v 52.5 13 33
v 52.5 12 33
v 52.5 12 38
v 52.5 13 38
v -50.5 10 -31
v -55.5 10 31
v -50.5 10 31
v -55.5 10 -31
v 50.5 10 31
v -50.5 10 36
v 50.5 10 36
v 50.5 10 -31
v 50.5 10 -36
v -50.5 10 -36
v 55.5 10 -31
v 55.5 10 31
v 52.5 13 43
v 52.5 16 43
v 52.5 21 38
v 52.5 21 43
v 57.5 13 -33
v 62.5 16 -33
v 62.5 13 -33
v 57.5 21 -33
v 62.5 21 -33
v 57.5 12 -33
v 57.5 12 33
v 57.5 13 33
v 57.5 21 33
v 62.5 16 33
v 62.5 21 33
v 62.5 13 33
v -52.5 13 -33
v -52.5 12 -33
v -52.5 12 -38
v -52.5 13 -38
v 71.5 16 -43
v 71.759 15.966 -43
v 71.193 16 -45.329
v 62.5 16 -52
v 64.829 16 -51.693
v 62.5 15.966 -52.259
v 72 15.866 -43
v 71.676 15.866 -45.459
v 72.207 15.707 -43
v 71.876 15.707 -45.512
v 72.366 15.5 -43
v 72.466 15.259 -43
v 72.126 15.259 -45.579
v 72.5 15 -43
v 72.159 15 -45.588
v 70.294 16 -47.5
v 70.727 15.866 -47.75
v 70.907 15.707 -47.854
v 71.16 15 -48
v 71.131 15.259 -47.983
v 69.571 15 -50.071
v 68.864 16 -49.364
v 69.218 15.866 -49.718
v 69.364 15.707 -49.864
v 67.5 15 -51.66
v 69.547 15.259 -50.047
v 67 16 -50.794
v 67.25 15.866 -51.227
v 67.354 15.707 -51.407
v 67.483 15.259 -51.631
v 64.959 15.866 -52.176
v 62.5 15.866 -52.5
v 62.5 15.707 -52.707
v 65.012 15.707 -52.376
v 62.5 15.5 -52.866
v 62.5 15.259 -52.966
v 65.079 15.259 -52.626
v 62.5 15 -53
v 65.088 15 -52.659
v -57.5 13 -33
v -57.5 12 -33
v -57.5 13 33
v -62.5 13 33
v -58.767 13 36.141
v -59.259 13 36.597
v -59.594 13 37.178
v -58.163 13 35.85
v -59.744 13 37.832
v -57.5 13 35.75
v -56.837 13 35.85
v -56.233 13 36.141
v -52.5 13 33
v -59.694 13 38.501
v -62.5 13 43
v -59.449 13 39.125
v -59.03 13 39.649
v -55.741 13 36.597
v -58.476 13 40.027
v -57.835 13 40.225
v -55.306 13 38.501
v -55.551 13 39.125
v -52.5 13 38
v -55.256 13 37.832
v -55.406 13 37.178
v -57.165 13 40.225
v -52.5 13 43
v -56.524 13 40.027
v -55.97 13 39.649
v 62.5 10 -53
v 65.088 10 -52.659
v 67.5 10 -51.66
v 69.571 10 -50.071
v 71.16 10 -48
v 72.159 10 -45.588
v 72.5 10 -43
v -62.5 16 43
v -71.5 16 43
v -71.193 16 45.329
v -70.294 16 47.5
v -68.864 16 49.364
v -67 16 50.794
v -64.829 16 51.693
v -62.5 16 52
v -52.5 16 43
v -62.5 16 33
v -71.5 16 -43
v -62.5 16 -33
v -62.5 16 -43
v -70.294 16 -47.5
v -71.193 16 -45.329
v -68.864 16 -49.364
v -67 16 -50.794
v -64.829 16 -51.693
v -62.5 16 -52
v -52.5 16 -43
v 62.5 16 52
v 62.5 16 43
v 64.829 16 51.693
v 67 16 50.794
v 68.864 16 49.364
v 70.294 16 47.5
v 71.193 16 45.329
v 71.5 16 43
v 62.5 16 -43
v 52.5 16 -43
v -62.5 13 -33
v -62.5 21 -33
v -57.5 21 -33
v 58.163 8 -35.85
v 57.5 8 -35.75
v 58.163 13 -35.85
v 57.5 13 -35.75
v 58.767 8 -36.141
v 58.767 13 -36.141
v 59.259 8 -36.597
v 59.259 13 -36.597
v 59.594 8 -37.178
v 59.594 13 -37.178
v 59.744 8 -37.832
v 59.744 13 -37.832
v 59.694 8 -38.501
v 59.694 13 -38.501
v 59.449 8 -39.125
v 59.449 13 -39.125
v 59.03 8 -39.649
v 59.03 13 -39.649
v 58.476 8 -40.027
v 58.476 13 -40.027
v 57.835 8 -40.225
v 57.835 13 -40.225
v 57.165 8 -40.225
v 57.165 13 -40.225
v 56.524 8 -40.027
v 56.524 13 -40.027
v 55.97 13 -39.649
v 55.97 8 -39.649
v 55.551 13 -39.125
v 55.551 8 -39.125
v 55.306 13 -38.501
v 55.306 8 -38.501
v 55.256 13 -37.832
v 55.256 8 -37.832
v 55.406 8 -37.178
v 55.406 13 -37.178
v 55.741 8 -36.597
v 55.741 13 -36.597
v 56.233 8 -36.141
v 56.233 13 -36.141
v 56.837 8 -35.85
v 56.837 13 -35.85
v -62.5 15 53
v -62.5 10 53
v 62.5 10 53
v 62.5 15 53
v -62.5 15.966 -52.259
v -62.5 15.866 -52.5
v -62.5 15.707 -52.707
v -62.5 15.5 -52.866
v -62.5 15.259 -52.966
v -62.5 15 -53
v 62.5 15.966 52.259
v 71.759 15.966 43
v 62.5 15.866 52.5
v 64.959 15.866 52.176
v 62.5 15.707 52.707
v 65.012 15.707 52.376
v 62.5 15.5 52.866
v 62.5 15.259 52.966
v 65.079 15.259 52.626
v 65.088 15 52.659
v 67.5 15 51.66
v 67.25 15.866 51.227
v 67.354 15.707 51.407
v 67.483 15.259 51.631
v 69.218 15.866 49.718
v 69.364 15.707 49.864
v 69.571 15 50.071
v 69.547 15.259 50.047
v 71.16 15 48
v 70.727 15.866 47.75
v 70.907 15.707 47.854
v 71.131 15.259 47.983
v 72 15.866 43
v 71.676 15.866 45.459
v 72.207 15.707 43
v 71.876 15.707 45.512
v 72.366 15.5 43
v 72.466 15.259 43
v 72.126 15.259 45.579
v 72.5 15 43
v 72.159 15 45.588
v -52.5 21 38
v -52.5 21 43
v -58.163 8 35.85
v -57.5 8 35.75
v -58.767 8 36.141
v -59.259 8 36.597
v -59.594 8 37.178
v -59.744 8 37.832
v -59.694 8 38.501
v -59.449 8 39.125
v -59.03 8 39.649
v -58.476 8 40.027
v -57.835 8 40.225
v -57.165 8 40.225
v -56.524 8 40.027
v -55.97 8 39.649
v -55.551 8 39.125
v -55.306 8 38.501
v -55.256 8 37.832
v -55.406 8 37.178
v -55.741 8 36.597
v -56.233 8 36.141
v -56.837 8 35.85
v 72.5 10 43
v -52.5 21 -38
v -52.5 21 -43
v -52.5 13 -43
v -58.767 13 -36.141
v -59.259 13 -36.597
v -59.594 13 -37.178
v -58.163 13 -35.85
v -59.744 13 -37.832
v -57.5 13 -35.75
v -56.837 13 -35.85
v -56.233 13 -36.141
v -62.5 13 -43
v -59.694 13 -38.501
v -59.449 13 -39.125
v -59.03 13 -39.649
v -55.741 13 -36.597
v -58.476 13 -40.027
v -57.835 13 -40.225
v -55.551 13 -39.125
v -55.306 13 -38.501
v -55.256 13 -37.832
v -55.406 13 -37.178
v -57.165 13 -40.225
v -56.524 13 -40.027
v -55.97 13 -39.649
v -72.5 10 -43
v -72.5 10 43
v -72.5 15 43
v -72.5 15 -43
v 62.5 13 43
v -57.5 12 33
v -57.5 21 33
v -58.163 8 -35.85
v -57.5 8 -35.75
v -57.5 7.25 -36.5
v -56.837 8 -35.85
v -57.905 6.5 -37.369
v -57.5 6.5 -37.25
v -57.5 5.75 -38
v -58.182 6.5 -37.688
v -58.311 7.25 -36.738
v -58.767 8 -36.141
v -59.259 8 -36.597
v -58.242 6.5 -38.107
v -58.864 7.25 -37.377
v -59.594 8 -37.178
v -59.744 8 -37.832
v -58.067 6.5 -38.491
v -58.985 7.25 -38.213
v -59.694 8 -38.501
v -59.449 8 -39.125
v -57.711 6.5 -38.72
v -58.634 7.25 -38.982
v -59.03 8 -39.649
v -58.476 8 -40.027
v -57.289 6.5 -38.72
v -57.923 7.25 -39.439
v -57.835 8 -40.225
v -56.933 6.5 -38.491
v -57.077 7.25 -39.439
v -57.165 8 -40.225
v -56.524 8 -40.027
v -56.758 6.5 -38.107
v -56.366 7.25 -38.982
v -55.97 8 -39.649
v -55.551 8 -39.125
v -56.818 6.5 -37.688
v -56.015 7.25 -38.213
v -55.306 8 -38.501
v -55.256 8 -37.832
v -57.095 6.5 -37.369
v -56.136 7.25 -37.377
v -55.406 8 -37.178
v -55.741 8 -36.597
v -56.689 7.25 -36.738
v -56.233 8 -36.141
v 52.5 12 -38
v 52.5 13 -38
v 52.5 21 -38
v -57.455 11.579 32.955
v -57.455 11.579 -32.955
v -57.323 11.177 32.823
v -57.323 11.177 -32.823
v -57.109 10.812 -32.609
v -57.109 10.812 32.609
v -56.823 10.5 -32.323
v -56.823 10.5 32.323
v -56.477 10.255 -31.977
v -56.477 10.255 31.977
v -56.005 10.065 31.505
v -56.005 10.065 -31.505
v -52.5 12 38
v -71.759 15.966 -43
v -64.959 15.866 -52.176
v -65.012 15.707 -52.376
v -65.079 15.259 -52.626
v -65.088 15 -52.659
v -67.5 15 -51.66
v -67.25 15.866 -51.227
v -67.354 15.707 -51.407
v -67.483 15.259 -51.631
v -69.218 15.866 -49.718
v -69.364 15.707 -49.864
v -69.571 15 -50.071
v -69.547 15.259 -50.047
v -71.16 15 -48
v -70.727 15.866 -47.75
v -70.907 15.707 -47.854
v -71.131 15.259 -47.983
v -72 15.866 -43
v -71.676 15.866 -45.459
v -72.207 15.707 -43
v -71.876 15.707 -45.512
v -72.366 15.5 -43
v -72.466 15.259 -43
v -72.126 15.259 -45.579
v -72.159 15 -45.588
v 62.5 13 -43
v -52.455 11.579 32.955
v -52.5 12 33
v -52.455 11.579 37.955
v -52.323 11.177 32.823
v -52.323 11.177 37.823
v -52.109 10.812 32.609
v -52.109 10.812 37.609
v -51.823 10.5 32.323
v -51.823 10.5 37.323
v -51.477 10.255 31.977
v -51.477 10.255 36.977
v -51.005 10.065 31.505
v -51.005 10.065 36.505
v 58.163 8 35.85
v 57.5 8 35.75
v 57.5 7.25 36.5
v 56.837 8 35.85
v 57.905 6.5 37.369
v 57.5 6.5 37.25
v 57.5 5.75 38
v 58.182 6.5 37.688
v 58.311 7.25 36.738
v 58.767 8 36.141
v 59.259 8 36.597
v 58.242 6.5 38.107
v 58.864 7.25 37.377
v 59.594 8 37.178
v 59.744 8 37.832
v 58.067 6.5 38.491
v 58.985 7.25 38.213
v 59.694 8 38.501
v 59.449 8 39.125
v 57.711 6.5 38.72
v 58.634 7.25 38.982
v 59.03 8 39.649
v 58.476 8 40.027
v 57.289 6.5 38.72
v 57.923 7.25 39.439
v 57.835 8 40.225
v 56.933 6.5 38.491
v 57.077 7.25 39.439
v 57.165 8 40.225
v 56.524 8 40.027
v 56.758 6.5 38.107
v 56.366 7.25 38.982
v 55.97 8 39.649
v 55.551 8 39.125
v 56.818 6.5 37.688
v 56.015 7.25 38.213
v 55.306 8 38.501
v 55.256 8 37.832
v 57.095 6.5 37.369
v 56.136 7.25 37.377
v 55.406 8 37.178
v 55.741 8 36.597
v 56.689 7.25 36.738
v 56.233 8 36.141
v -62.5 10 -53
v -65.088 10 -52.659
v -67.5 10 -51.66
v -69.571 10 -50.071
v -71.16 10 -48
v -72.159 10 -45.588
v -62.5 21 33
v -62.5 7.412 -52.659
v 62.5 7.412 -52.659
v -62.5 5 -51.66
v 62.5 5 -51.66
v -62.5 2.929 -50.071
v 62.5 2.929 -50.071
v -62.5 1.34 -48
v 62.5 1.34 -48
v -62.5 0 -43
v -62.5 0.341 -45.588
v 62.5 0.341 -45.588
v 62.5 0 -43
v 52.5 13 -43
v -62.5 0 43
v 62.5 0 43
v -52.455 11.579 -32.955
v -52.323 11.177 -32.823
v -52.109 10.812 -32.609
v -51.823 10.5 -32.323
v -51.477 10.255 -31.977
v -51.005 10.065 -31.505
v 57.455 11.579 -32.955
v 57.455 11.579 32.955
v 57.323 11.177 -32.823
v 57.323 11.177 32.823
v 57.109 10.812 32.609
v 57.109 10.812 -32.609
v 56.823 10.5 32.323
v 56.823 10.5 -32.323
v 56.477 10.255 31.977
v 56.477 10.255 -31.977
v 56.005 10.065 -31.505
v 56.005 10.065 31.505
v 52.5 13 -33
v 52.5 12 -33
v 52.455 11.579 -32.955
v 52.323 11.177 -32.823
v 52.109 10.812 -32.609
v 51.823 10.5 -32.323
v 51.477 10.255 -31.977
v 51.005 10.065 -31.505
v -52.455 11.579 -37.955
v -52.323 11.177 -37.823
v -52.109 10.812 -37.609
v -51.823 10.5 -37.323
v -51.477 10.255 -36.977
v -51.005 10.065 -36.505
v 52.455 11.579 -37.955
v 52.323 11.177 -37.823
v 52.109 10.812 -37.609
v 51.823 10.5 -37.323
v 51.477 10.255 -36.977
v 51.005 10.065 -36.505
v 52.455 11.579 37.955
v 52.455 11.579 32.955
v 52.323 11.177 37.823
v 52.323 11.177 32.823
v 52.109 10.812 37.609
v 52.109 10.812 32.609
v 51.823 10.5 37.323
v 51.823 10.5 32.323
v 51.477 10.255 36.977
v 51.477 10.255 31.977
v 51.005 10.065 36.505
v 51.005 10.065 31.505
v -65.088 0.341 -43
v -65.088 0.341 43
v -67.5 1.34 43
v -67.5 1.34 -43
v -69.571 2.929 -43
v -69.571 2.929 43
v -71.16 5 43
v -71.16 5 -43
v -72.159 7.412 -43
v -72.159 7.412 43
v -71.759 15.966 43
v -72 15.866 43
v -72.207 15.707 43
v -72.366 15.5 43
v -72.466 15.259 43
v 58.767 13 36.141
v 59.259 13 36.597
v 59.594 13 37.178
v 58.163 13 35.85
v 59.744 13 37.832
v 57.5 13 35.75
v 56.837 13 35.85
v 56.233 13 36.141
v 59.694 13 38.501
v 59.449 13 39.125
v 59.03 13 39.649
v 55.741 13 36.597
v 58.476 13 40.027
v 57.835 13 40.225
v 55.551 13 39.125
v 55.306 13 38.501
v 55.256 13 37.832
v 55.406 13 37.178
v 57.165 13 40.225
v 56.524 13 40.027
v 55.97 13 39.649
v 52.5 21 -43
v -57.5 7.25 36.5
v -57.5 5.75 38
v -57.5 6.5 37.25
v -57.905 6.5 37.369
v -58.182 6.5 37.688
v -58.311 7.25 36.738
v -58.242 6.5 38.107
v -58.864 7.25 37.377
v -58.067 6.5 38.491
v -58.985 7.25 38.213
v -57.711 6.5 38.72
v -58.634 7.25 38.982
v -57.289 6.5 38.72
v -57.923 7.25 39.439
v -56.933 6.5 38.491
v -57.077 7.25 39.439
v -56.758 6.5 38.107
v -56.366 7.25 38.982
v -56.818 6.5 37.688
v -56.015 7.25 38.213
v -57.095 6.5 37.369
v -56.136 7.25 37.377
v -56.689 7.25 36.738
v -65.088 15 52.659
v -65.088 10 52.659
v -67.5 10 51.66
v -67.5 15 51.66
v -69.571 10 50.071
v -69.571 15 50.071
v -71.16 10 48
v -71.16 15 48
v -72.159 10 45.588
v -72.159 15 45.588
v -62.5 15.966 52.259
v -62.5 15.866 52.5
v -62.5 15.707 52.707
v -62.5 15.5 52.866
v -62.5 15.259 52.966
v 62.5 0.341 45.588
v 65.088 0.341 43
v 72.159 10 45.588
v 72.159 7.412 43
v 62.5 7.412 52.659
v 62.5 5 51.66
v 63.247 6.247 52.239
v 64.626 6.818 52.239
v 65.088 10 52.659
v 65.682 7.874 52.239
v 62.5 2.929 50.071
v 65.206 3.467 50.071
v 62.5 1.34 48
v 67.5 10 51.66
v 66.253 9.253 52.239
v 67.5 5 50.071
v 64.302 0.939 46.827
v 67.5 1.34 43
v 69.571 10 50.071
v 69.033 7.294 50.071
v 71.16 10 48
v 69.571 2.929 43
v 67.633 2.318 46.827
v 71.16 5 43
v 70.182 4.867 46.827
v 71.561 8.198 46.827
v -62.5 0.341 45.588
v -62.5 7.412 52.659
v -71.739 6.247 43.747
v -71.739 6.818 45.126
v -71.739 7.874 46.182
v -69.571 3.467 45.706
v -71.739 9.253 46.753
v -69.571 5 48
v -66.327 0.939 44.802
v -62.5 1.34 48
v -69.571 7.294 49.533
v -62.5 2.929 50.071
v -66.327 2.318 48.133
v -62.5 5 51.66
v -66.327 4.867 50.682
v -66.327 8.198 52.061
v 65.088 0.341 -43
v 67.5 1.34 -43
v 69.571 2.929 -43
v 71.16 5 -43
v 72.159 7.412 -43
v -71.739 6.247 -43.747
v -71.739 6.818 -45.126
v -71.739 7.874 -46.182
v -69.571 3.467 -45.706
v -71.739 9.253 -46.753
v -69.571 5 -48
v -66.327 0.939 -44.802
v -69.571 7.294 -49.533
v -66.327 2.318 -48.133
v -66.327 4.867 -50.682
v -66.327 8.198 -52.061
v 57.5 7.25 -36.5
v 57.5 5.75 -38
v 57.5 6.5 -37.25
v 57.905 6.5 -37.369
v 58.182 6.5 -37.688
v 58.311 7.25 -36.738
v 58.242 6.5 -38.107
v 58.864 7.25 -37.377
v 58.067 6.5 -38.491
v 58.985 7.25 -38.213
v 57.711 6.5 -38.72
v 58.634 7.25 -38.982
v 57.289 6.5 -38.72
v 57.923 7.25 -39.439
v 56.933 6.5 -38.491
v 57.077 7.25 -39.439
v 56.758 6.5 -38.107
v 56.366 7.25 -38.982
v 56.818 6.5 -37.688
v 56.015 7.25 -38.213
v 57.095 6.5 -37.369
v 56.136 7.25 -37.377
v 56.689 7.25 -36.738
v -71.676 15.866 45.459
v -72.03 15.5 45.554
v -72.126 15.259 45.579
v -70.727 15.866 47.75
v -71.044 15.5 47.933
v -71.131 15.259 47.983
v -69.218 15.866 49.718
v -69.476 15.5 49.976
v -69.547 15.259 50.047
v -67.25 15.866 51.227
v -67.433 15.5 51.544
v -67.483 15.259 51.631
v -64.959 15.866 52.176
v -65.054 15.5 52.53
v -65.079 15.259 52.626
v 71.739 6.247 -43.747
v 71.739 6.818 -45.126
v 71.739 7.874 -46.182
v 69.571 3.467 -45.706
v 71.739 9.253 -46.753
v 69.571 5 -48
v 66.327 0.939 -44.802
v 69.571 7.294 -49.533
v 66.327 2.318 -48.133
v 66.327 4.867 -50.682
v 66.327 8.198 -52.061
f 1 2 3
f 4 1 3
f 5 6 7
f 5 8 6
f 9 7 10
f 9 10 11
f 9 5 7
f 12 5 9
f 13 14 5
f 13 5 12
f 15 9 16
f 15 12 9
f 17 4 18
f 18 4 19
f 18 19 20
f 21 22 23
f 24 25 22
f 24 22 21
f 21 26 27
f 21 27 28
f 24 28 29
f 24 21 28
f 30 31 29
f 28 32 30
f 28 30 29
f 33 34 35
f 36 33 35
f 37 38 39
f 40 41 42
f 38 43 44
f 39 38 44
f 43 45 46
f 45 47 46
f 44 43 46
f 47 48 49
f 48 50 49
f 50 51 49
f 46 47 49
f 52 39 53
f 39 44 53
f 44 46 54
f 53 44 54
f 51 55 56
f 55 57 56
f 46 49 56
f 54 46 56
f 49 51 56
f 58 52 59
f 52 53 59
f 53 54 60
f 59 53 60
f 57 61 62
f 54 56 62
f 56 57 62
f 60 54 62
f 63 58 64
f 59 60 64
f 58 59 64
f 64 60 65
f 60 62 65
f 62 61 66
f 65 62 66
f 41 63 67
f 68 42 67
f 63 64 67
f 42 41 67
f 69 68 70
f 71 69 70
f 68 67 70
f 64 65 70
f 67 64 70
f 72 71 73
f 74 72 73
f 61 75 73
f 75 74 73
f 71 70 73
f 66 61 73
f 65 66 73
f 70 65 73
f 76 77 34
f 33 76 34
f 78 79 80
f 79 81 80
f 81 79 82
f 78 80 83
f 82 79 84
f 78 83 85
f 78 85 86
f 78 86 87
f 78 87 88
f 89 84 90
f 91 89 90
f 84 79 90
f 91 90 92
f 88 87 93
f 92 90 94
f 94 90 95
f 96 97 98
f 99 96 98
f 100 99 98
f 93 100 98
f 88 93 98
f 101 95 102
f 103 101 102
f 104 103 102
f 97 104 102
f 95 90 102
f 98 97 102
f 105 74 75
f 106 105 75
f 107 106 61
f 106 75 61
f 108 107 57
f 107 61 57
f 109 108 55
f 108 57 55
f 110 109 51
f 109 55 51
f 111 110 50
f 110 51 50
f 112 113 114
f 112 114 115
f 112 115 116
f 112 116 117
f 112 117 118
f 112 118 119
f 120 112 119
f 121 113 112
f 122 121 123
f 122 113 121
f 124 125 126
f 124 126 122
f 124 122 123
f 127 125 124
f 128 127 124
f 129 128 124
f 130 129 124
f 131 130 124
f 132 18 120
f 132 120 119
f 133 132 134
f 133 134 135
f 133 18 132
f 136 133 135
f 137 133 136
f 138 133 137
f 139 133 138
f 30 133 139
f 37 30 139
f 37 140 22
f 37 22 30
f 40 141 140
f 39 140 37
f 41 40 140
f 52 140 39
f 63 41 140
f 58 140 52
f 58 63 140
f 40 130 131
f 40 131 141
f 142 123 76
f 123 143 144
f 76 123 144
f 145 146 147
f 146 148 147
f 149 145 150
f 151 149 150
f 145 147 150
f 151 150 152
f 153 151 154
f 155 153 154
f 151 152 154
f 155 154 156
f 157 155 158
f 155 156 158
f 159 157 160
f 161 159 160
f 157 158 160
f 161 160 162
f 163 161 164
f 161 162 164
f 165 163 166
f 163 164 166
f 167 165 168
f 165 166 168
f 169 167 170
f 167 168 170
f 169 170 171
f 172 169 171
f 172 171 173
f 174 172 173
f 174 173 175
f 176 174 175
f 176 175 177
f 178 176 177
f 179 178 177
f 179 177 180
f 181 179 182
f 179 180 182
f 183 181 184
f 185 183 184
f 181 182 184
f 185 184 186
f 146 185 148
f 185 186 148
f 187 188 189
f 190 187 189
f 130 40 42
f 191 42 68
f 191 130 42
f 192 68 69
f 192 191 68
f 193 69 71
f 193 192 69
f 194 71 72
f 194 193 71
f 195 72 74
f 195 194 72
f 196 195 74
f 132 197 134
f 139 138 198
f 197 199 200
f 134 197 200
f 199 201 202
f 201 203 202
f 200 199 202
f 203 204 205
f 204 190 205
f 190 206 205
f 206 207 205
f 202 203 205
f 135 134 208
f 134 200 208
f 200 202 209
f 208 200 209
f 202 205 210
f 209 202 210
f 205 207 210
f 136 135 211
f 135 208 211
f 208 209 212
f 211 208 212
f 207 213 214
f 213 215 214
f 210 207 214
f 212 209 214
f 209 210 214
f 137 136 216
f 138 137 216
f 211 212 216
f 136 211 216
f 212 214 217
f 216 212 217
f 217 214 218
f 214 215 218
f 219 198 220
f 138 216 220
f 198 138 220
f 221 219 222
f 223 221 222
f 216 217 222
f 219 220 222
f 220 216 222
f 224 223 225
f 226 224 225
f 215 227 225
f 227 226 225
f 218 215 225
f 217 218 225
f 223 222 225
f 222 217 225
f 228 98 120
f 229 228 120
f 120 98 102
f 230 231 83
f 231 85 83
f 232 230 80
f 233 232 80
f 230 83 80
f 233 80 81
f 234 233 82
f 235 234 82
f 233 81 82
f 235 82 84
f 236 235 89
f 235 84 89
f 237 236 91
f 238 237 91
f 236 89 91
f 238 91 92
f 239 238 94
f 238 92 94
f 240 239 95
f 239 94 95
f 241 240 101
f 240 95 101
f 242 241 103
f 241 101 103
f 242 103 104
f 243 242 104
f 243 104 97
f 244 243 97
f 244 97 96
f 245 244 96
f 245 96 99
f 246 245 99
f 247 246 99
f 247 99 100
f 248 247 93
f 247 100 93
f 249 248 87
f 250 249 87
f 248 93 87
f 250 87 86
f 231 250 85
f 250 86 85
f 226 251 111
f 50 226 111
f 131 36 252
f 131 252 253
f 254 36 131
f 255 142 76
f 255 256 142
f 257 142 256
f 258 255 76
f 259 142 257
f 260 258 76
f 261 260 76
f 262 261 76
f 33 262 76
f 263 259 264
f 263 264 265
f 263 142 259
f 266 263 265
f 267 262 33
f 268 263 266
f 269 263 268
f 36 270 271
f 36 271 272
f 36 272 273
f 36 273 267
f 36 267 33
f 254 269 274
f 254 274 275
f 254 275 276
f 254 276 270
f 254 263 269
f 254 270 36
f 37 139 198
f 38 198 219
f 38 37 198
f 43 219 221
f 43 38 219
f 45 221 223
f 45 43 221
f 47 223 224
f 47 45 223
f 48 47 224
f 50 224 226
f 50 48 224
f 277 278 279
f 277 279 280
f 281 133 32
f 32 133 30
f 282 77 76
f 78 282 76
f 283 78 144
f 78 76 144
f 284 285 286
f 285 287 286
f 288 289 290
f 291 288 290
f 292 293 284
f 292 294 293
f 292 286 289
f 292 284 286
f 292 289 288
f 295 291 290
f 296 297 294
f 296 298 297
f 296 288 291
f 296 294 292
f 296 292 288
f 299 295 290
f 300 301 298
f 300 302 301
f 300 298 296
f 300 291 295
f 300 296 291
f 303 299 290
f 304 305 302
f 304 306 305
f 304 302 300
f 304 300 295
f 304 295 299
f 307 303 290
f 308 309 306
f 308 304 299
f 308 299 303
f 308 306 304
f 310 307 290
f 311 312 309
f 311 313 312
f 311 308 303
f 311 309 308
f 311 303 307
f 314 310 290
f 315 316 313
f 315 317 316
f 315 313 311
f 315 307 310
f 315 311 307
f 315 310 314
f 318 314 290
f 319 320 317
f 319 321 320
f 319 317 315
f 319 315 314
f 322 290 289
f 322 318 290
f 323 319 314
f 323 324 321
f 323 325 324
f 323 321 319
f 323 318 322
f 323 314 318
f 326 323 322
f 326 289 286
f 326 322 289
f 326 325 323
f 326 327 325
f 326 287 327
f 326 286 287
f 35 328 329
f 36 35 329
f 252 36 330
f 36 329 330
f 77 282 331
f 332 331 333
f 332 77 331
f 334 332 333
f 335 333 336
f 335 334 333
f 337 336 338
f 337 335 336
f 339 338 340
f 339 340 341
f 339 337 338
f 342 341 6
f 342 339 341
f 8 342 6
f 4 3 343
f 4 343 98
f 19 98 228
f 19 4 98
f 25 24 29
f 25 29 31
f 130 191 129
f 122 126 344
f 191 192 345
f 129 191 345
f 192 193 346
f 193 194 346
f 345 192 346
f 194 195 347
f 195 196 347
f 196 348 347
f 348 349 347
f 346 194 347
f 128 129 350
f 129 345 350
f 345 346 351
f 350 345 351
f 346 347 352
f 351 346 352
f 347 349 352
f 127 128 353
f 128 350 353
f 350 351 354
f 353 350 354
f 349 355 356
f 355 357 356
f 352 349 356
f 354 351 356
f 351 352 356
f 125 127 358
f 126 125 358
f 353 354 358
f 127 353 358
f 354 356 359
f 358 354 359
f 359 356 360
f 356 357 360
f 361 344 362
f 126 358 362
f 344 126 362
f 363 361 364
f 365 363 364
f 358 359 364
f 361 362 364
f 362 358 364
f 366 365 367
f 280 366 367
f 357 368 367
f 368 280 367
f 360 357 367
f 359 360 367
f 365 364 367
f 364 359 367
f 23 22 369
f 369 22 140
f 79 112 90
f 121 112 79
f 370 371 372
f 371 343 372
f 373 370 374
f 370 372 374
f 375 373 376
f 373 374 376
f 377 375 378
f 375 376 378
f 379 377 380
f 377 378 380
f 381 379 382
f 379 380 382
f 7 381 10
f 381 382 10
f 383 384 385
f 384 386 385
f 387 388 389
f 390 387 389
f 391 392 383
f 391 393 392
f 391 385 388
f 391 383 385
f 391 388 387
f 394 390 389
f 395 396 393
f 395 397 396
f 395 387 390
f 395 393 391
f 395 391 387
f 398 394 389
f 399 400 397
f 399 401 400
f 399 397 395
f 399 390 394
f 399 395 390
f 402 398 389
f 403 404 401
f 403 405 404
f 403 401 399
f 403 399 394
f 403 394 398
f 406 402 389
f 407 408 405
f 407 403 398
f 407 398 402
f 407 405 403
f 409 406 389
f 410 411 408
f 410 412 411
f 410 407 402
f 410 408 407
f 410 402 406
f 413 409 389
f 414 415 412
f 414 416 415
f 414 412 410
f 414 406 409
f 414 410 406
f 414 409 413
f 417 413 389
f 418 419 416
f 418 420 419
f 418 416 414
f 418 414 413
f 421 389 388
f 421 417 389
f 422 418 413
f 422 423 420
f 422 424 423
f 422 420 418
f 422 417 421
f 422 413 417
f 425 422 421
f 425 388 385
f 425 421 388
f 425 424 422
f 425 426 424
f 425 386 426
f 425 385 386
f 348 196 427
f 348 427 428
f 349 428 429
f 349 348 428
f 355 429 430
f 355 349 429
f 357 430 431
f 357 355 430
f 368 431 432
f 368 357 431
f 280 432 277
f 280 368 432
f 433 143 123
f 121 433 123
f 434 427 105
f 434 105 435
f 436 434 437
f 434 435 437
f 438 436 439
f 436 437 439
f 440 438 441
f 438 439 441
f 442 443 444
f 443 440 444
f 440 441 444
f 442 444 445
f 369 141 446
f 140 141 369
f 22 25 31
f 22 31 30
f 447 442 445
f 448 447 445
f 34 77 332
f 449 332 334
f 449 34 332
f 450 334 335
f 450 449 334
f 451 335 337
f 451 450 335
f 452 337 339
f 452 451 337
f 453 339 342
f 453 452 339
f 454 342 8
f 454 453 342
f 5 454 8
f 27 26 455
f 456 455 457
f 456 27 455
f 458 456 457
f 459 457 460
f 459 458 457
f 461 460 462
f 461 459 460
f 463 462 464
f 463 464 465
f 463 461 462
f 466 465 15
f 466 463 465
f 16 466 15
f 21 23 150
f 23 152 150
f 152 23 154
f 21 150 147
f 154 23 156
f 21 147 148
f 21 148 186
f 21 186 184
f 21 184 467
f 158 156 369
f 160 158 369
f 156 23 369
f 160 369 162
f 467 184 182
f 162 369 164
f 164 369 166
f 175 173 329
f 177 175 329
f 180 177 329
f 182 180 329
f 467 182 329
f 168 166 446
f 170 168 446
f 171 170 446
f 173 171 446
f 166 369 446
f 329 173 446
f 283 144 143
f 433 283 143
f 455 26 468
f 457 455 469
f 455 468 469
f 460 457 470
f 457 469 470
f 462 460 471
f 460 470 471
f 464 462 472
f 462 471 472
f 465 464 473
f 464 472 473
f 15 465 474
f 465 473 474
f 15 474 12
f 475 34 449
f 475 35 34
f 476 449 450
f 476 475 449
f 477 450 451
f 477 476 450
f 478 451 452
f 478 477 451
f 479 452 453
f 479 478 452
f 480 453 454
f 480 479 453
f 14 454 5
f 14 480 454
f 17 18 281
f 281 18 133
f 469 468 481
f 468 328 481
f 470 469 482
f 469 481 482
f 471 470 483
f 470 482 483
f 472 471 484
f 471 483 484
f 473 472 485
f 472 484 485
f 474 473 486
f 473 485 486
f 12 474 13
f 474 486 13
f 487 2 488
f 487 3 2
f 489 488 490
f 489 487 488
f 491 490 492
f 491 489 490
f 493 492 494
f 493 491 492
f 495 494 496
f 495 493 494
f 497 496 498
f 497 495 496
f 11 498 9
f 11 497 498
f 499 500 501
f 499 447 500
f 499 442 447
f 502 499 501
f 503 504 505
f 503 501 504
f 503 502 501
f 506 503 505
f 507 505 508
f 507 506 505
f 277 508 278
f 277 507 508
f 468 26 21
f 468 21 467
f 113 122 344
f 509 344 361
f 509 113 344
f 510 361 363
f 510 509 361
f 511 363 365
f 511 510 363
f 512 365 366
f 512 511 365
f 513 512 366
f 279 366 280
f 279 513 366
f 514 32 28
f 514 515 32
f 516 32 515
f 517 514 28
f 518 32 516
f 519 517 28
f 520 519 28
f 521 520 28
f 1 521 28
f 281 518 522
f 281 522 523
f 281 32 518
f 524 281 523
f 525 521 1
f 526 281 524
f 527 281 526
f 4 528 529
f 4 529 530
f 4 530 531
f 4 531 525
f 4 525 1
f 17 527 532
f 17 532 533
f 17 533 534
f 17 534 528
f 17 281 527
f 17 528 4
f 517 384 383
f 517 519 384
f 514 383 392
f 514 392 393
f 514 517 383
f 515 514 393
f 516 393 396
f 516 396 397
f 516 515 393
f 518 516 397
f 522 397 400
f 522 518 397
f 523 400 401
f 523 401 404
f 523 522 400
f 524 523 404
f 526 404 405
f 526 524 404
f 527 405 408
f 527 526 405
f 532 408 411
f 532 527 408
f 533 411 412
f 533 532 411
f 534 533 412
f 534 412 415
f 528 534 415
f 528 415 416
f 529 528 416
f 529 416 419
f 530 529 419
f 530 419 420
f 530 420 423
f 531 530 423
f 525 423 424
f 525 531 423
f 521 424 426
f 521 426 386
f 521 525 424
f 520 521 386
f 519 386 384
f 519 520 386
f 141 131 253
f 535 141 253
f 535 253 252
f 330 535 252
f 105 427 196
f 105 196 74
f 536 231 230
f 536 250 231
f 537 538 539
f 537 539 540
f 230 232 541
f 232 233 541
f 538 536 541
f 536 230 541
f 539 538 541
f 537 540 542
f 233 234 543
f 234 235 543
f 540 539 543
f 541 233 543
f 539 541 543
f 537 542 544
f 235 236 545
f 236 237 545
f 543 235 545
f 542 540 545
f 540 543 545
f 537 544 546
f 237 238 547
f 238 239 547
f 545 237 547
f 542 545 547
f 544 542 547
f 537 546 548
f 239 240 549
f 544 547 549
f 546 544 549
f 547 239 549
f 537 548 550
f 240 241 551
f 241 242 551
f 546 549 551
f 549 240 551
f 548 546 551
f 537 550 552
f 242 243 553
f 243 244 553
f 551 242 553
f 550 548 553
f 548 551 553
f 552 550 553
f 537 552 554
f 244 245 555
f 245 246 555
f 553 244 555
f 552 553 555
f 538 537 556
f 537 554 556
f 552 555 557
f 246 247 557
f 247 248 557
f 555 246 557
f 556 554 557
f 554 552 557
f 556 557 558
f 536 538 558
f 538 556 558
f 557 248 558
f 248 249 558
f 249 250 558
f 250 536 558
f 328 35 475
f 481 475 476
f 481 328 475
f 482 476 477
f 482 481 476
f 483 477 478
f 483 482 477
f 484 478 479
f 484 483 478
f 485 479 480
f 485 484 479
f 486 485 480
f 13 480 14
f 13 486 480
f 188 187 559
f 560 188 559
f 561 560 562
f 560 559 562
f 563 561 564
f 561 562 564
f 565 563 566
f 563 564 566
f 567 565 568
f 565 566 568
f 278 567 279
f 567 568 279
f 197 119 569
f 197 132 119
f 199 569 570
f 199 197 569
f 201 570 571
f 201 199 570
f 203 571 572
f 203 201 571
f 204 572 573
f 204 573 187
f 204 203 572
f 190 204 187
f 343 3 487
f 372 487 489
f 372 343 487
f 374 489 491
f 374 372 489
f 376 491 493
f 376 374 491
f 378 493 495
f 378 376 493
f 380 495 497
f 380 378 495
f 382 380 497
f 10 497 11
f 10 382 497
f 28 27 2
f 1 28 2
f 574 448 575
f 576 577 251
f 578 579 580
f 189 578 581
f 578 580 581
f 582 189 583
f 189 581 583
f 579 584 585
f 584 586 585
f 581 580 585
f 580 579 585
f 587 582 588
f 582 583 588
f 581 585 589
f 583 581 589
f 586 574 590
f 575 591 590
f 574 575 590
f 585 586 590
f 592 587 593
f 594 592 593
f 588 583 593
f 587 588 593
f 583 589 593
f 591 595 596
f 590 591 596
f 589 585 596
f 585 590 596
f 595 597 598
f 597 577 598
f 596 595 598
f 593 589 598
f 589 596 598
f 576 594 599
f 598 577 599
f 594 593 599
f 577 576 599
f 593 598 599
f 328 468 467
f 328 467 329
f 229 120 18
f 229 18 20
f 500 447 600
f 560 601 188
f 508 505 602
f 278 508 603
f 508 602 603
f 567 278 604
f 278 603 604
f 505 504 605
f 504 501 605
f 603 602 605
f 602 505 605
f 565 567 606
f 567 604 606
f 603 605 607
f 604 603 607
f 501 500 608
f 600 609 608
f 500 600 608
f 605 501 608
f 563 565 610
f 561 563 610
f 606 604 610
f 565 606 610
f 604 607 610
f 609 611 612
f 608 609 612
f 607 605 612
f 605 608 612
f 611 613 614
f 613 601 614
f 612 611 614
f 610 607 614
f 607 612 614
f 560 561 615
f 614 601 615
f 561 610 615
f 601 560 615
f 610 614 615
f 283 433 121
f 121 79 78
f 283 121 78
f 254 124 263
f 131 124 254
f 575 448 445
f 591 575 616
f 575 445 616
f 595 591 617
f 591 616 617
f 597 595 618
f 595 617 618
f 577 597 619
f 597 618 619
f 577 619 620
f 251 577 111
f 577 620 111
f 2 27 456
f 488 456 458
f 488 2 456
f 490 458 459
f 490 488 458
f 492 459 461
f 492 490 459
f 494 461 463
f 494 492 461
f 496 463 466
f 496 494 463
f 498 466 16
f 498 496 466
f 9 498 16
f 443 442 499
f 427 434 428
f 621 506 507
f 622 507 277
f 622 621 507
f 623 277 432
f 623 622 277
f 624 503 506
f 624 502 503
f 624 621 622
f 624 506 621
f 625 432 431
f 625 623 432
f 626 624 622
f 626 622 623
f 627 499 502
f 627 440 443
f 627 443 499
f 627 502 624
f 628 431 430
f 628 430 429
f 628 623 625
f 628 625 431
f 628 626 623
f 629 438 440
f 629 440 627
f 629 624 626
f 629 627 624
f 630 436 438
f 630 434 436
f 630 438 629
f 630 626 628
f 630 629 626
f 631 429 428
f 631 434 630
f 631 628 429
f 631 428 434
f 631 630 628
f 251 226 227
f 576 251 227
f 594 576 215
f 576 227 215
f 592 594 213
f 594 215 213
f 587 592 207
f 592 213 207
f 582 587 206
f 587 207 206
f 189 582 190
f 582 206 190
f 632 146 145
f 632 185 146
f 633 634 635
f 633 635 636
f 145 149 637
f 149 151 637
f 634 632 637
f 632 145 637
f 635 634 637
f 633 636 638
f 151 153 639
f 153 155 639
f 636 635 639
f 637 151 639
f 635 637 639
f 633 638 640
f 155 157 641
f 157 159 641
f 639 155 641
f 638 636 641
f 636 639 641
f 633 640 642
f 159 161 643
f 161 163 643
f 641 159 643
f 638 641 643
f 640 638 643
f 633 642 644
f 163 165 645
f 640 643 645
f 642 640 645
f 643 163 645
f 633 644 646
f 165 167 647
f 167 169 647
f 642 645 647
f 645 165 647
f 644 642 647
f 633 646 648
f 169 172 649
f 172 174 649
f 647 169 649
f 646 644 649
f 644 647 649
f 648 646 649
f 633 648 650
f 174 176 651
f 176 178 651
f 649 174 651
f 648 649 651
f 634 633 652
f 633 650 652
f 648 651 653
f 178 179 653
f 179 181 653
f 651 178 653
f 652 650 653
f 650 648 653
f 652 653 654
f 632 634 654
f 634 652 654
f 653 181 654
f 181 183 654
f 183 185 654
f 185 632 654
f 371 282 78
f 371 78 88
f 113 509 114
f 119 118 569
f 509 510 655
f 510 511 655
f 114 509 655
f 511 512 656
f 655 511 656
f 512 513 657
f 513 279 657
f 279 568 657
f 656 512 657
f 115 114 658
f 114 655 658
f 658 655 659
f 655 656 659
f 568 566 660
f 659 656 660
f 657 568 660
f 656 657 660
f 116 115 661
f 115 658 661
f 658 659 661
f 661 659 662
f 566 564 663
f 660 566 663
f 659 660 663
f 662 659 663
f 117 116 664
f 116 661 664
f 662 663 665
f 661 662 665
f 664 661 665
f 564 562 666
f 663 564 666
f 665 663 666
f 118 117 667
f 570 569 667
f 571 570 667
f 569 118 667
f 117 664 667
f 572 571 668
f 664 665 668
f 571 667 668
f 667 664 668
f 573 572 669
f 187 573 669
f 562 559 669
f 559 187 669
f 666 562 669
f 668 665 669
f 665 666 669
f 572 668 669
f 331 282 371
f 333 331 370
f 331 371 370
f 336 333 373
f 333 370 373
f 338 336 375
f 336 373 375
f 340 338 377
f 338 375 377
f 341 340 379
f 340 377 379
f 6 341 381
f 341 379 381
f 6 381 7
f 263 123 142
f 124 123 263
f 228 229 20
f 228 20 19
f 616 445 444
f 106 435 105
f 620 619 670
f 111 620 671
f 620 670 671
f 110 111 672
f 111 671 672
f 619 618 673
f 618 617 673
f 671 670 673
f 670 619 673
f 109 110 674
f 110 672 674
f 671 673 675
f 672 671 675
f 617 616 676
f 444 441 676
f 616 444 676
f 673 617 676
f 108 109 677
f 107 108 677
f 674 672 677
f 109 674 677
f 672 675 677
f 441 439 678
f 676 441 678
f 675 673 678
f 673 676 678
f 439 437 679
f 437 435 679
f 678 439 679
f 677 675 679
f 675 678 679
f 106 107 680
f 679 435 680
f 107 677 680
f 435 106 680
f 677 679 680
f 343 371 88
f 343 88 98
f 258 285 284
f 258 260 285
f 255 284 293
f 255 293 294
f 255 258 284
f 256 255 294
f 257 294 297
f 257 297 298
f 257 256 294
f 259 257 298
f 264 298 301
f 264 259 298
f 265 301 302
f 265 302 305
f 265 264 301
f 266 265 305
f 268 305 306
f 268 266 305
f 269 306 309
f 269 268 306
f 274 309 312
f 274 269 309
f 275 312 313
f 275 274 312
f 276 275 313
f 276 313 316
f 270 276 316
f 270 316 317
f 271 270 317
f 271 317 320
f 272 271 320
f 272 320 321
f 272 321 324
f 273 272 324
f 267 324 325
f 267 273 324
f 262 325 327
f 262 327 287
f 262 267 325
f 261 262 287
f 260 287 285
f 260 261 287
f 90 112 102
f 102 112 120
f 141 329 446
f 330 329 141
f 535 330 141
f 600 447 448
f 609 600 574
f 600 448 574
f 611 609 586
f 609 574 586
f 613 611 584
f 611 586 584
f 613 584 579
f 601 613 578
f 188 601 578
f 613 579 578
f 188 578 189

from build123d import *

# Parameters (mm, degrees)
SKETCH1_W                       = 145
SKETCH1_H                       = 106
BOSS_EXTRUDE1_DEPTH             = 16
CUT_EXTRUDE1_START              = 16
SKETCH1_4_W                     = 125
SKETCH1_4_H                     = 86
CUT_EXTRUDE1_DEPTH              = 6
SKETCH6_W                       = 10
SKETCH6_H                       = 10
BOSS_EXTRUDE5_DEPTH             = 3
MIRROR2_COPY_1_SKETCH_W         = 10
MIRROR2_COPY_1_SKETCH_H         = 10
MIRROR2_COPY_1_DEPTH            = 3
BOSS_EXTRUDE6_REACH             = 93.221
BOSS_EXTRUDE6_DIRECTION_2_REACH = 93.221
BOSS_EXTRUDE7_REACH             = 94.229
SKETCH9_W                       = 5
SKETCH9_H                       = 11
BOSS_EXTRUDE7_DIRECTION_2_REACH = 94.229
FILLET1_R                       = 10
FILLET3_R                       = 2
FILLET11_R                      = 1


with BuildPart() as part:
    # Sketch1 → Boss-Extrude1 (new body)
    with BuildSketch(Plane(origin=(0, 0, 0), x_dir=(1, 0, 0), z_dir=(0, 1, 0))):
        Rectangle(SKETCH1_W, SKETCH1_H)
    extrude(amount=BOSS_EXTRUDE1_DEPTH)

    # Sketch1<4> → Cut-Extrude1 (cut)
    with BuildSketch(Plane(origin=(0, 0, 0), x_dir=(1, 0, 0), z_dir=(0, 1, 0)).offset(CUT_EXTRUDE1_START)):
        Rectangle(SKETCH1_4_W, SKETCH1_4_H)
    extrude(amount=-CUT_EXTRUDE1_DEPTH, mode=Mode.SUBTRACT)

    # Sketch6 → Boss-Extrude5 (add)
    with BuildSketch(Plane(origin=(0, 10, 0), x_dir=(1, 0, 0), z_dir=(0, 1, 0))):
        with Locations((-57.5, 38)):
            Rectangle(SKETCH6_W, SKETCH6_H)
    boss_extrude5 = extrude(amount=BOSS_EXTRUDE5_DEPTH)

    # Sketch8 → M4 Clearance Hole1 (revolve, cut)
    with BuildSketch(Plane(origin=(-57.5, 13, -38), x_dir=(0, 0, 1), z_dir=(1, 0, 0))):
        Polygon((0, 0), (0, 7.25), (2.25, 5), (2.25, 0), align=None)
    m4_clearance_hole1 = revolve(axis=Axis((-57.5, 19.35, -38), (0, -1, 0)), mode=Mode.SUBTRACT)

    # Mirror1: Boss-Extrude5, M4 Clearance Hole1 across plane
    add(boss_extrude5.mirror(Plane(origin=(0, 0, 0), x_dir=(0, 0, 1), z_dir=(1, 0, 0))))
    add(m4_clearance_hole1.mirror(Plane(origin=(0, 0, 0), x_dir=(0, 0, 1), z_dir=(1, 0, 0))), mode=Mode.SUBTRACT)

    # Mirror2: Boss-Extrude5, M4 Clearance Hole1 across plane
    add(boss_extrude5.mirror(Plane.XY))
    add(m4_clearance_hole1.mirror(Plane.XY), mode=Mode.SUBTRACT)

    # Mirror2 copy 1 sketch → Mirror2 copy 1 (add)
    with BuildSketch(Plane(origin=(0, 10, 0), x_dir=(-1, 0, 0), z_dir=(0, 1, 0))):
        with Locations((-57.5, 38)):
            Rectangle(MIRROR2_COPY_1_SKETCH_W, MIRROR2_COPY_1_SKETCH_H)
    extrude(amount=MIRROR2_COPY_1_DEPTH)

    # Mirror2 copy 2 sketch → Mirror2 copy 2 (revolve, cut)
    with BuildSketch(Plane(origin=(57.5, 13, 38), x_dir=(0, 0, -1), z_dir=(-1, 0, 0))):
        Polygon((0, 0), (0, 7.25), (2.25, 5), (2.25, 0), align=None)
    revolve(axis=Axis((57.5, 19.35, 38), (0, -1, 0)), mode=Mode.SUBTRACT)

    # Boss-Extrude6: up to this face of the body (flat: up to its plane)
    boss_extrude6_end = Plane(part.part.faces().sort_by_distance((-57.5, 11.5, -33))[0])
    # Sketch4 → Boss-Extrude6 (add, up to the picked face)
    with BuildSketch(Plane.XY, mode=Mode.PRIVATE) as boss_extrude6_sk1:
        Polygon((-57.5, 10), (-57.5, 21), (-62.5, 21), (-62.5, 16), (-62.5, 10), align=None)
    boss_extrude6_tool1 = split(extrude(boss_extrude6_sk1.sketch, amount=-BOSS_EXTRUDE6_REACH, mode=Mode.PRIVATE), bisect_by=boss_extrude6_end, keep=Keep.BOTH, mode=Mode.PRIVATE)
    boss_extrude6 = boss_extrude6_tool1.solids().sort_by(Axis((-60, 15.5, 0), (0, 0, -1)))[0]
    add(boss_extrude6)

    # Boss-Extrude6 direction 2: up to this face of the body (flat: up to its plane)
    boss_extrude6_direction_2_end = Plane(part.part.faces().sort_by_distance((-57.5, 11.5, 33))[0])
    # Sketch4 → Boss-Extrude6 direction 2 (add, up to the picked face)
    with BuildSketch(Plane.XY, mode=Mode.PRIVATE) as boss_extrude6_direction_2_sk1:
        Polygon((-57.5, 10), (-57.5, 21), (-62.5, 21), (-62.5, 16), (-62.5, 10), align=None)
    boss_extrude6_direction_2_tool1 = split(extrude(boss_extrude6_direction_2_sk1.sketch, amount=BOSS_EXTRUDE6_DIRECTION_2_REACH, mode=Mode.PRIVATE), bisect_by=boss_extrude6_direction_2_end, keep=Keep.BOTH, mode=Mode.PRIVATE)
    boss_extrude6_direction_2 = boss_extrude6_direction_2_tool1.solids().sort_by(Axis((-60, 15.5, 0), (0, 0, 1)))[0]
    add(boss_extrude6_direction_2)

    # Boss-Extrude7: up to this face of the body (flat: up to its plane)
    boss_extrude7_end = Plane(part.part.faces().sort_by_distance((52.5, 11.5, 38))[0])
    # Sketch9 → Boss-Extrude7 (add, up to the picked face)
    with BuildSketch(Plane(origin=(0, 0, 0), x_dir=(0, 0, -1), z_dir=(1, 0, 0)), mode=Mode.PRIVATE) as boss_extrude7_sk1:
        with Locations((-40.5, 15.5)):
            Rectangle(SKETCH9_W, SKETCH9_H)
    boss_extrude7_tool1 = split(extrude(boss_extrude7_sk1.sketch, amount=BOSS_EXTRUDE7_REACH, mode=Mode.PRIVATE), bisect_by=boss_extrude7_end, keep=Keep.BOTH, mode=Mode.PRIVATE)
    boss_extrude7 = boss_extrude7_tool1.solids().sort_by(Axis((0, 15.5, 40.5), (1, 0, 0)))[0]
    add(boss_extrude7)

    # Boss-Extrude7 direction 2: up to this face of the body (flat: up to its plane)
    boss_extrude7_direction_2_end = Plane(part.part.faces().sort_by_distance((-52.5, 11.5, 38))[0])
    # Sketch9 → Boss-Extrude7 direction 2 (add, up to the picked face)
    with BuildSketch(Plane(origin=(0, 0, 0), x_dir=(0, 0, -1), z_dir=(1, 0, 0)), mode=Mode.PRIVATE) as boss_extrude7_direction_2_sk1:
        with Locations((-40.5, 15.5)):
            Rectangle(SKETCH9_W, SKETCH9_H)
    boss_extrude7_direction_2_tool1 = split(extrude(boss_extrude7_direction_2_sk1.sketch, amount=-BOSS_EXTRUDE7_DIRECTION_2_REACH, mode=Mode.PRIVATE), bisect_by=boss_extrude7_direction_2_end, keep=Keep.BOTH, mode=Mode.PRIVATE)
    boss_extrude7_direction_2 = boss_extrude7_direction_2_tool1.solids().sort_by(Axis((0, 15.5, 40.5), (-1, 0, 0)))[0]
    add(boss_extrude7_direction_2)

    # Mirror3: Boss-Extrude6, Boss-Extrude6 direction 2 across plane
    add(boss_extrude6.mirror(Plane(origin=(0, 0, 0), x_dir=(0, 0, 1), z_dir=(1, 0, 0))))
    add(boss_extrude6_direction_2.mirror(Plane(origin=(0, 0, 0), x_dir=(0, 0, 1), z_dir=(1, 0, 0))))

    # Mirror4: Boss-Extrude7, Boss-Extrude7 direction 2 across plane
    add(boss_extrude7.mirror(Plane.XY))
    add(boss_extrude7_direction_2.mirror(Plane.XY))

    # Fillet1
    fillet1_edges = [part.edges().sort_by_distance(p)[0] for p in [
        (0, 0, -53),
        (72.5, 0, 0),
        (0, 0, 53),
        (-72.5, 0, 0),
        (-72.5, 8, -53),
        (72.5, 8, -53),
        (72.5, 8, 53),
        (-72.5, 8, 53),
    ]]
    fillet(fillet1_edges, radius=FILLET1_R)

    # Fillet3
    fillet3_edges = [part.edges().sort_by_distance(p)[0] for p in [
        (-55, 10, 33),
        (-55, 10, -33),
        (-57.5, 10, 0),
        (0, 10, 38),
        (55, 10, 33),
        (55, 10, -33),
        (57.5, 10, 0),
        (0, 10, -38),
        (-52.5, 10, -35.5),
        (52.5, 10, -35.5),
        (52.5, 10, 35.5),
        (-52.5, 10, 35.5),
    ]]
    fillet(fillet3_edges, radius=FILLET3_R)

    # Fillet11
    fillet11_edges = [part.edges().sort_by_distance(p)[0] for p in [
        (0, 16, 53),
        (72.5, 16, 0),
        (0, 16, -53),
        (-72.5, 16, 0),
        (-69.571067812, 16, 50.071067812),
        (69.571067812, 16, 50.071067812),
        (69.571067812, 16, -50.071067812),
        (-69.571067812, 16, -50.071067812),
    ]]
    fillet(fillet11_edges, radius=FILLET11_R)


solid = part.part
